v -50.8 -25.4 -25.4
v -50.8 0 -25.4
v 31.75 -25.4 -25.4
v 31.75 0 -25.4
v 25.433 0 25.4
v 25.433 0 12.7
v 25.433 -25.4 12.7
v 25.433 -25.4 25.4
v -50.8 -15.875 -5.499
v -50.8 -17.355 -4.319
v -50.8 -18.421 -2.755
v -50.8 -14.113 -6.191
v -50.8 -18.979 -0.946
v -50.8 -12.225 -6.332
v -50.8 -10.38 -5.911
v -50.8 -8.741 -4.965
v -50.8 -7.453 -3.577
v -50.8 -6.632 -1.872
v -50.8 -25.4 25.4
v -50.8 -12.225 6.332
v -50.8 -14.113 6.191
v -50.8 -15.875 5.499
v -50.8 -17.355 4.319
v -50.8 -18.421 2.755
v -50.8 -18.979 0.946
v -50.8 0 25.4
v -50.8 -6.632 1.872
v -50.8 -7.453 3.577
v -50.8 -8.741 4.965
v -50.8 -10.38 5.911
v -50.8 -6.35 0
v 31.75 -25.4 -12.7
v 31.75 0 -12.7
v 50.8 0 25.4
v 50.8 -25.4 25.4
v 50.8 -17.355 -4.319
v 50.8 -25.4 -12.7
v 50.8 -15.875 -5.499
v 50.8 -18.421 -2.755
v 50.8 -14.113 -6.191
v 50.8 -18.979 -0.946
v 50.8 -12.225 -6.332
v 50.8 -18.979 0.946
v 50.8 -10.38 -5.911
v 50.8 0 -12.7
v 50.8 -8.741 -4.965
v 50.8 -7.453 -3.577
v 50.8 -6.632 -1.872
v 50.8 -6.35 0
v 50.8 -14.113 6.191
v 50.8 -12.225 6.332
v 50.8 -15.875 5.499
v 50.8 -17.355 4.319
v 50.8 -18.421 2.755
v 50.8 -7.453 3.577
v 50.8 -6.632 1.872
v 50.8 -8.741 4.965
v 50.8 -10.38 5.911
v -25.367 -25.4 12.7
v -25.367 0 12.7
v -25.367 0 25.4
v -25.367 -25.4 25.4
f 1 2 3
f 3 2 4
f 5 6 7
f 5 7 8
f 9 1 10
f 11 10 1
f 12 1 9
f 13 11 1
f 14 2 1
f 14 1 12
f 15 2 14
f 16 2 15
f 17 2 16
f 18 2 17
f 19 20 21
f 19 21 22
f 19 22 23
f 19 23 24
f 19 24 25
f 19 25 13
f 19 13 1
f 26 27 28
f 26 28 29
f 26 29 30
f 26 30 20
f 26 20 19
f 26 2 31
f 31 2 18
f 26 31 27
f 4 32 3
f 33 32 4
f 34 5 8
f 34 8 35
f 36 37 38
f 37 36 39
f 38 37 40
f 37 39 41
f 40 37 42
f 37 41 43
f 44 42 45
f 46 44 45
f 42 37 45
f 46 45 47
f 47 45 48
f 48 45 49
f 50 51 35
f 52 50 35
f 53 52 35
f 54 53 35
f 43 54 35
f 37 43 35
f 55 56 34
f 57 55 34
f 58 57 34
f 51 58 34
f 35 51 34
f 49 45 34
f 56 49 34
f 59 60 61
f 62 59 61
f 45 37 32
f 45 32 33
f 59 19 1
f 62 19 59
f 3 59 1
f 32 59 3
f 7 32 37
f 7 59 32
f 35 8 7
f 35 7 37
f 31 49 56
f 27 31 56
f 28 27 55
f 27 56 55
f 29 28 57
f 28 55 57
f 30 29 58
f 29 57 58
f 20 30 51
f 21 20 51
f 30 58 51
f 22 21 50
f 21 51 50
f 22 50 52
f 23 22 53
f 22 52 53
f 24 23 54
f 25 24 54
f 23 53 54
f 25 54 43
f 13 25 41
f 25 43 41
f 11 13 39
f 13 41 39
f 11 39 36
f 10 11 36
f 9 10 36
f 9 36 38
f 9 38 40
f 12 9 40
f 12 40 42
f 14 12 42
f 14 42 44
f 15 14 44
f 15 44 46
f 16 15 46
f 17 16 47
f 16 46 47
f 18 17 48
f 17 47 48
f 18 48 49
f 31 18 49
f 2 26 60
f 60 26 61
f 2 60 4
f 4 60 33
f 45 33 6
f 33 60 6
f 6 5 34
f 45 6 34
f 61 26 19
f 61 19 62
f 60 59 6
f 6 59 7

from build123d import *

# Parameters (mm, degrees)
F0_W     = 101.6
F0_H     = 50.8
F1_DEPTH = 25.4
F2_W     = 50.8
F2_H     = 12.7
F4_DEPTH = 25.4
F3_W     = 25.4
F3_H     = 12.7
F5_DEPTH = 19.05
F6_R     = 6.35
F7_DEPTH = 101.6


with BuildPart() as f1:
    # F0 (on Front) → F1 (new body)
    with BuildSketch(Plane.XZ):
        Rectangle(F0_W, F0_H)
    extrude(amount=F1_DEPTH)

    # F2 (on face) → F4 (cut)
    with BuildSketch(Plane.XZ.offset(25.4)):
        with Locations((0.033422, 19.05)):
            Rectangle(F2_W, F2_H)
    extrude(amount=-F4_DEPTH, mode=Mode.SUBTRACT)

    # F3 (on face) → F5 (cut)
    with BuildSketch(Plane.YZ.offset(50.8)):
        with Locations((-12.7, -19.05)):
            Rectangle(F3_W, F3_H)
    extrude(amount=-F5_DEPTH, mode=Mode.SUBTRACT)

    # F6 (on face) → F7 (cut)
    with BuildSketch(Plane.YZ.offset(50.8)):
        with Locations((-12.7, 0)):
            Circle(F6_R)
    extrude(amount=-F7_DEPTH, mode=Mode.SUBTRACT)


solid = f1.part
